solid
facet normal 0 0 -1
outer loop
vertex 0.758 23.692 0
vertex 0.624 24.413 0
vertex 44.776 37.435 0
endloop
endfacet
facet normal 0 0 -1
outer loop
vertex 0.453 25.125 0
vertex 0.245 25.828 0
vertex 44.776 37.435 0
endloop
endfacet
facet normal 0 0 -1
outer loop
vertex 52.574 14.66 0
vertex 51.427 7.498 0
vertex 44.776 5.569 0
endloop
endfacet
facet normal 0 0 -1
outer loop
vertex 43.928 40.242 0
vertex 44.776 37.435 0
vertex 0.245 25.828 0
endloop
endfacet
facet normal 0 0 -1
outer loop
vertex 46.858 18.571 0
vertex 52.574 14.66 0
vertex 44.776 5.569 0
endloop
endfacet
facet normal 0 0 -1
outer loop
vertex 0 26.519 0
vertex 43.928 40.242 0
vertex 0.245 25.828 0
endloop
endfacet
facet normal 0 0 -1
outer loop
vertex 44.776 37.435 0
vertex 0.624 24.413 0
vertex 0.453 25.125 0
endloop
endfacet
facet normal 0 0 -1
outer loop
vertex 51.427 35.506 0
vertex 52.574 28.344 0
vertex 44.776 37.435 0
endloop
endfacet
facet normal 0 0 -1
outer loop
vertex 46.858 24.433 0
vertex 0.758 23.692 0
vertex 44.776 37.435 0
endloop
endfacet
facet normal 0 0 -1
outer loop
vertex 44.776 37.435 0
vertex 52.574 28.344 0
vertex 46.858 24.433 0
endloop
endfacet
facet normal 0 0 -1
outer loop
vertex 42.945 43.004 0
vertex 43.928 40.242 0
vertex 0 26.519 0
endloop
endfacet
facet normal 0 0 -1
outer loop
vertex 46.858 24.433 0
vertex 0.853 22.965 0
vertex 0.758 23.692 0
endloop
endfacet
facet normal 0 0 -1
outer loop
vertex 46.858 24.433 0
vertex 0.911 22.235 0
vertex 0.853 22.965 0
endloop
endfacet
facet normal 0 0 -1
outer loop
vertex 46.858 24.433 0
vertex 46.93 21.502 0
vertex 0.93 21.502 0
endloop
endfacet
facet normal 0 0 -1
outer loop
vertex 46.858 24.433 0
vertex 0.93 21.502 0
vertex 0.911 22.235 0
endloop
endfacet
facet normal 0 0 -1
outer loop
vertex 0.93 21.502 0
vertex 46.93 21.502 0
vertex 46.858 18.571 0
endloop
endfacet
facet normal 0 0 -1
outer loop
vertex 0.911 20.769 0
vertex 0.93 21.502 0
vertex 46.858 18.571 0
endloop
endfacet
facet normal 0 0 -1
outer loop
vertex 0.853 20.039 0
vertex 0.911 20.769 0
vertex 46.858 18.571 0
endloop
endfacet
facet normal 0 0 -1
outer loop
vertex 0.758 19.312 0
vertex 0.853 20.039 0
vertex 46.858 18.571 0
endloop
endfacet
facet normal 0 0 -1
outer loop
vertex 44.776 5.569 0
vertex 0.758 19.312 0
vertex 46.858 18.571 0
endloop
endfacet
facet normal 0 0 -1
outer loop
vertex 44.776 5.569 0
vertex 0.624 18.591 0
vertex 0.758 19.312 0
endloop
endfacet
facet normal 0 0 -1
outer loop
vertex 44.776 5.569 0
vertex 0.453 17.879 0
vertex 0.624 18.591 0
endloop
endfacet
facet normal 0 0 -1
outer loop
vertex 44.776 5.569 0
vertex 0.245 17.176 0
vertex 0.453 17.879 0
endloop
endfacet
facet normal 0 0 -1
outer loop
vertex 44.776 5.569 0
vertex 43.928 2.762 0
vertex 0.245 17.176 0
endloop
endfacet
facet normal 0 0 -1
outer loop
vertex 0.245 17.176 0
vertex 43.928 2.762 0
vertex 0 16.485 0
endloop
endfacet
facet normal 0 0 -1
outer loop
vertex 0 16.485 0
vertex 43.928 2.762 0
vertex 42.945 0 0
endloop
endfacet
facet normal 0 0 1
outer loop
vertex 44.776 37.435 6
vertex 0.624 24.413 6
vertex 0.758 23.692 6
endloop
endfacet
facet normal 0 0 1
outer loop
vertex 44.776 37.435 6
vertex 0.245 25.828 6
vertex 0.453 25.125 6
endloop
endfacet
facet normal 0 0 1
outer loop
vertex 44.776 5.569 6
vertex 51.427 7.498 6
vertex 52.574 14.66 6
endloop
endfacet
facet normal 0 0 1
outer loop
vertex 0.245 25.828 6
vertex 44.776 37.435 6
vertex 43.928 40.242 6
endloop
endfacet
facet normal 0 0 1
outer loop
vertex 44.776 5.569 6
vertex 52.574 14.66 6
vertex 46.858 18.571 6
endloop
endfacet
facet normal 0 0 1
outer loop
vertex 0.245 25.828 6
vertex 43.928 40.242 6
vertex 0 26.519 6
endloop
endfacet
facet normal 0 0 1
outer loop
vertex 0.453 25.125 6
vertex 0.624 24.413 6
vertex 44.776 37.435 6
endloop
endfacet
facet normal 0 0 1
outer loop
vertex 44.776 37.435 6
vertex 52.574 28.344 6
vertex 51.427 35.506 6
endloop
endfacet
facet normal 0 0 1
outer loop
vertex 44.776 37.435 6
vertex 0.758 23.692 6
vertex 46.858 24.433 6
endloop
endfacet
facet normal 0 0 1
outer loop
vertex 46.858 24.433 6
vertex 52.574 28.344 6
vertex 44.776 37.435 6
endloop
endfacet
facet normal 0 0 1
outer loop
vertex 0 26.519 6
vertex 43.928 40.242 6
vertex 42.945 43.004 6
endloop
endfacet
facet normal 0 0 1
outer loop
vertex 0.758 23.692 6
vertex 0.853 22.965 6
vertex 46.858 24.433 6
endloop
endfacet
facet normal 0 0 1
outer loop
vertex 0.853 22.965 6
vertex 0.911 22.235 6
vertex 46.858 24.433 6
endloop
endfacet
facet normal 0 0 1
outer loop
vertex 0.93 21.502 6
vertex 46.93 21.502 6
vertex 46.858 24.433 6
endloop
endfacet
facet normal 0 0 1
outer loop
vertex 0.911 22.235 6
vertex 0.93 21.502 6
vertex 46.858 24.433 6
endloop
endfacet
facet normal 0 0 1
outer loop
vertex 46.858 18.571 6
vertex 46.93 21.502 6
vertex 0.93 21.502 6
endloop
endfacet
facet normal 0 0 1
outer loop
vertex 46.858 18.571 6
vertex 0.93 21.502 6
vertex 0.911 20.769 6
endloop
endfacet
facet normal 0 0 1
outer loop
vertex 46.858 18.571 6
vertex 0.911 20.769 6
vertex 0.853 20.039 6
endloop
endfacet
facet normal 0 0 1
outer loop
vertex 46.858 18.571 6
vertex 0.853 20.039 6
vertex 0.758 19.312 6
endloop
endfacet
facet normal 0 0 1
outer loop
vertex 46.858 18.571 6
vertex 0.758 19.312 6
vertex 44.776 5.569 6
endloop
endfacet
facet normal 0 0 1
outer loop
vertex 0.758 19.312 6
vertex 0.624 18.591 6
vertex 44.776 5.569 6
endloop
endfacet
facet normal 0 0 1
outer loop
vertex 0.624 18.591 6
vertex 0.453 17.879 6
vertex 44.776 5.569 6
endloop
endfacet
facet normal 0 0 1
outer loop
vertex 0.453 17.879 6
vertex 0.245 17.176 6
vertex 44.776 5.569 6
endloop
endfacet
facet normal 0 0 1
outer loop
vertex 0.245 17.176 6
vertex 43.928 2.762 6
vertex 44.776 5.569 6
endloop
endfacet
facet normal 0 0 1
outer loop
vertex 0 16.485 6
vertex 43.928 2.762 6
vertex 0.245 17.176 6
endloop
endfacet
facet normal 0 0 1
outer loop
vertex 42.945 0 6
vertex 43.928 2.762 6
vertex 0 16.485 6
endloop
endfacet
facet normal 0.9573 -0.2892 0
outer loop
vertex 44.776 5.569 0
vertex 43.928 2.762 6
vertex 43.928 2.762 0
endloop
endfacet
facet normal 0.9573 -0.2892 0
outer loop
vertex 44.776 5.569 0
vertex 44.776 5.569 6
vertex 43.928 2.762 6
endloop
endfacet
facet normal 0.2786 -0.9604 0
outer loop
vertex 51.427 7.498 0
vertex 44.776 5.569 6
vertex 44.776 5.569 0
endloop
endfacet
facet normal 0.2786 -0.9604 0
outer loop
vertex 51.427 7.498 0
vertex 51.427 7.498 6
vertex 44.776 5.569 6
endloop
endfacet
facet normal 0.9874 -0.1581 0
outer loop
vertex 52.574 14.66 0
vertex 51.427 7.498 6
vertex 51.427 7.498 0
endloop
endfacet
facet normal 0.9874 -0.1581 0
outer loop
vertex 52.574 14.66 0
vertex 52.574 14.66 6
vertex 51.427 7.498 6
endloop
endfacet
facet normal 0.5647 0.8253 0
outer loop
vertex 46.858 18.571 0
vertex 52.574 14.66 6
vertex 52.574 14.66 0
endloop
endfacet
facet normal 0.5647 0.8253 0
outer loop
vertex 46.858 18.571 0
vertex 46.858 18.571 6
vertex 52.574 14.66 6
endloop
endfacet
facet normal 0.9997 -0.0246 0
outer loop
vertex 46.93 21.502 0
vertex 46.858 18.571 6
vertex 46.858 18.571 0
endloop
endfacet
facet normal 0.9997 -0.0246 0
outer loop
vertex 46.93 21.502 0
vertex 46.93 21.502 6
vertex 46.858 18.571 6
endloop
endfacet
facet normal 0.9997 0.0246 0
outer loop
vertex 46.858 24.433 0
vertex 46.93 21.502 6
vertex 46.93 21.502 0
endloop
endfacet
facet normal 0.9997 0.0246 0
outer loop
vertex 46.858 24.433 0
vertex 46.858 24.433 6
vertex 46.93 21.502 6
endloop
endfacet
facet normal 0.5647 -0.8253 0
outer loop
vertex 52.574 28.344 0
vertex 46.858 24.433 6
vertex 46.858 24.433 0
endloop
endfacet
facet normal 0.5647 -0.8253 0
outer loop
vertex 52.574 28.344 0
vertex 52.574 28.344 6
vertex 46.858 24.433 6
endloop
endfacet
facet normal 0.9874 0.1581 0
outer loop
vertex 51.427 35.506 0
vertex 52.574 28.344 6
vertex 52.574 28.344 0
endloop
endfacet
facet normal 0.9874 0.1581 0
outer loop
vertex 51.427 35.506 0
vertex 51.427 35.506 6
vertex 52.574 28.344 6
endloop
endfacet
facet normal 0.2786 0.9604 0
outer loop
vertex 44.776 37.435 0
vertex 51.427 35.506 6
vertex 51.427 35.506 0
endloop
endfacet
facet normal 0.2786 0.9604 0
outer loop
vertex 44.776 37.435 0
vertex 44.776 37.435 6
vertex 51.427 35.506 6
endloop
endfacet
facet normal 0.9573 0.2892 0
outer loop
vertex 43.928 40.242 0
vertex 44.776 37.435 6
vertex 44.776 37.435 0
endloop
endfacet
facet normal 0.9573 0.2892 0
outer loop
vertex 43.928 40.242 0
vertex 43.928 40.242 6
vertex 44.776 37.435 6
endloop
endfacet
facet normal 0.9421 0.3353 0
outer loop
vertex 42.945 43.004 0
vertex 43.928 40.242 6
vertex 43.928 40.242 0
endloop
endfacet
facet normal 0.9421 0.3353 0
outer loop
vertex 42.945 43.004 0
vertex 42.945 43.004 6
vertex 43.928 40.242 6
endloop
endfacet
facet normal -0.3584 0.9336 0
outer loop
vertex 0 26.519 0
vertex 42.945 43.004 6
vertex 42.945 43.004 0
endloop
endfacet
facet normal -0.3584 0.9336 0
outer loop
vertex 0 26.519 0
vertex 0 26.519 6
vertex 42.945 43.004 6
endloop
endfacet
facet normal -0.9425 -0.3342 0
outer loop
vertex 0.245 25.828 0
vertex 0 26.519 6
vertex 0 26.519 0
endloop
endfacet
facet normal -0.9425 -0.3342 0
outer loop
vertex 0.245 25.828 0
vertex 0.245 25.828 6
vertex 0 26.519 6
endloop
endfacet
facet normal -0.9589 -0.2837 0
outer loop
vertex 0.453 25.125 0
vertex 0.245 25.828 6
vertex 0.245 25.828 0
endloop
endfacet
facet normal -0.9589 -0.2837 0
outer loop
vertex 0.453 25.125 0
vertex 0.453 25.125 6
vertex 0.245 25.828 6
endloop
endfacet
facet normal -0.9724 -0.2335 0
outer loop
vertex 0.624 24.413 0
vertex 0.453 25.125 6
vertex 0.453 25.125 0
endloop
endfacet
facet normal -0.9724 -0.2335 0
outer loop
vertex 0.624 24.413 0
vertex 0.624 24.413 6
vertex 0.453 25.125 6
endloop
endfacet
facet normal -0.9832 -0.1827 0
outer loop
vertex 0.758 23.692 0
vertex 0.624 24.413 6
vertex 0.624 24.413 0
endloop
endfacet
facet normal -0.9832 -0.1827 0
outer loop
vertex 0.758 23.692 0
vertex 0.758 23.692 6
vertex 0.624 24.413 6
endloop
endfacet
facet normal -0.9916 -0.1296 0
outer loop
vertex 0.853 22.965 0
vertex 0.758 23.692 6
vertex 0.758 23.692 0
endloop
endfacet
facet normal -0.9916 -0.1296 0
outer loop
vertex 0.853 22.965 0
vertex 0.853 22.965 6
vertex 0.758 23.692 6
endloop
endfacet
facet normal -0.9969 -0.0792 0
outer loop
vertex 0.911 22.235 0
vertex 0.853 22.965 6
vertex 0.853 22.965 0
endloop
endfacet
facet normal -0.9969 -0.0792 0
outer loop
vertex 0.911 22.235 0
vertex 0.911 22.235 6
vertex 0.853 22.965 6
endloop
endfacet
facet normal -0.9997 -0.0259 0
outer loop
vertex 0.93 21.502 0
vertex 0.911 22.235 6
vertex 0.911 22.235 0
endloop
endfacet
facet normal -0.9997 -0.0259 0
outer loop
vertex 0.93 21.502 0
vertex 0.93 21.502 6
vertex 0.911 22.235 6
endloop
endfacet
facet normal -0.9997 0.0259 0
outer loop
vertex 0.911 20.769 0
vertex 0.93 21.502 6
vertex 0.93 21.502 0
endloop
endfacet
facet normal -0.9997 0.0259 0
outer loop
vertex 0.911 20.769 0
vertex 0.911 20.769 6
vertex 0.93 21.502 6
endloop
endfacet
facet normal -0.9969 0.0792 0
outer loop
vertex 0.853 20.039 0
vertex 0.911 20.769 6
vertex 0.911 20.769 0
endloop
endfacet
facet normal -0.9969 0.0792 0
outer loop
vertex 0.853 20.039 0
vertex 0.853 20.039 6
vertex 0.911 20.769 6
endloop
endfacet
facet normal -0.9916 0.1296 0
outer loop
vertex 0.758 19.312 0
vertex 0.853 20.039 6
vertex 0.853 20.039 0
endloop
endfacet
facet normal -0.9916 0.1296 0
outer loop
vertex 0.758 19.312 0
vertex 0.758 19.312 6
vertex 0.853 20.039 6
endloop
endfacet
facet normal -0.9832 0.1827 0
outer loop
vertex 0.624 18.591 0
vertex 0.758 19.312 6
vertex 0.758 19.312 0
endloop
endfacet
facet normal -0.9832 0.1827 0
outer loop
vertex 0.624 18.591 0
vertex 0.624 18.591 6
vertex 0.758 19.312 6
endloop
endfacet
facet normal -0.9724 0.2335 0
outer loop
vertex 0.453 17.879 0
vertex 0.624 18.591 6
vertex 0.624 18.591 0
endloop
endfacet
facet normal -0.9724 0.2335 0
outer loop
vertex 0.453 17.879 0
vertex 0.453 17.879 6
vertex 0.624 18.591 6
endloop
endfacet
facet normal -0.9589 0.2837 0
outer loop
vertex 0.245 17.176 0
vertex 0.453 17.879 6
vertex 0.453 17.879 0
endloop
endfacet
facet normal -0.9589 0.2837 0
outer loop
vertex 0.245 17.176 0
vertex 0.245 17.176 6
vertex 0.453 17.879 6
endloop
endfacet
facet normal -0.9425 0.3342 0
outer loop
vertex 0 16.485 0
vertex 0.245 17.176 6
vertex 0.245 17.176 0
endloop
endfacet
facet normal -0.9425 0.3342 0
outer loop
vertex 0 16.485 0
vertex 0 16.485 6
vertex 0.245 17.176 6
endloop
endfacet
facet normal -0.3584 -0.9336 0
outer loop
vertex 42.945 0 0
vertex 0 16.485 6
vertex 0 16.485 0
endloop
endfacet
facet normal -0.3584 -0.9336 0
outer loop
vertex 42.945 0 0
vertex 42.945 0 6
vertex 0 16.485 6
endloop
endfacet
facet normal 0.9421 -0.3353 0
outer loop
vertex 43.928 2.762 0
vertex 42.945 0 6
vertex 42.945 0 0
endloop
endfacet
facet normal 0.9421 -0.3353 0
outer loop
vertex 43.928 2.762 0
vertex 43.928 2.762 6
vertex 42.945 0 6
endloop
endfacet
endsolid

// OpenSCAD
$fn = 32;

// ----------------------------------------------------------------------
// Gear sector: 2 teeth on 42 degrees
// ----------------------------------------------------------------------

// --- parameters (mm) ---
sector_angle = 42;        // sector angle, degrees
root_r = 60;              // root circle radius
tooth_h = 6;              // tooth height over the root circle
teeth = 2;                // number of teeth on the sector
hub_r = 14;               // hub bore radius
plate_t = 6;              // sector thickness, Z
arc_step = 3;             // sampling step of the root/hub arcs, degrees

tip_r = root_r + tooth_h;  // tip circle radius

profile = [[42.945, 0], [43.928, 2.762], [44.776, 5.569], [51.427, 7.498], [52.574, 14.66], [46.858, 18.571], [46.93, 21.502], [46.858, 24.433], [52.574, 28.344], [51.427, 35.506], [44.776, 37.435], [43.928, 40.242], [42.945, 43.004], [0, 26.519], [0.245, 25.828], [0.453, 25.125], [0.624, 24.413], [0.758, 23.692], [0.853, 22.965], [0.911, 22.235], [0.93, 21.502], [0.911, 20.769], [0.853, 20.039], [0.758, 19.312], [0.624, 18.591], [0.453, 17.879], [0.245, 17.176], [0, 16.485]];  // primary outline, 28 points, counter clockwise

// --- the one profile operation ---
linear_extrude(height = plate_t) polygon(points = profile);
